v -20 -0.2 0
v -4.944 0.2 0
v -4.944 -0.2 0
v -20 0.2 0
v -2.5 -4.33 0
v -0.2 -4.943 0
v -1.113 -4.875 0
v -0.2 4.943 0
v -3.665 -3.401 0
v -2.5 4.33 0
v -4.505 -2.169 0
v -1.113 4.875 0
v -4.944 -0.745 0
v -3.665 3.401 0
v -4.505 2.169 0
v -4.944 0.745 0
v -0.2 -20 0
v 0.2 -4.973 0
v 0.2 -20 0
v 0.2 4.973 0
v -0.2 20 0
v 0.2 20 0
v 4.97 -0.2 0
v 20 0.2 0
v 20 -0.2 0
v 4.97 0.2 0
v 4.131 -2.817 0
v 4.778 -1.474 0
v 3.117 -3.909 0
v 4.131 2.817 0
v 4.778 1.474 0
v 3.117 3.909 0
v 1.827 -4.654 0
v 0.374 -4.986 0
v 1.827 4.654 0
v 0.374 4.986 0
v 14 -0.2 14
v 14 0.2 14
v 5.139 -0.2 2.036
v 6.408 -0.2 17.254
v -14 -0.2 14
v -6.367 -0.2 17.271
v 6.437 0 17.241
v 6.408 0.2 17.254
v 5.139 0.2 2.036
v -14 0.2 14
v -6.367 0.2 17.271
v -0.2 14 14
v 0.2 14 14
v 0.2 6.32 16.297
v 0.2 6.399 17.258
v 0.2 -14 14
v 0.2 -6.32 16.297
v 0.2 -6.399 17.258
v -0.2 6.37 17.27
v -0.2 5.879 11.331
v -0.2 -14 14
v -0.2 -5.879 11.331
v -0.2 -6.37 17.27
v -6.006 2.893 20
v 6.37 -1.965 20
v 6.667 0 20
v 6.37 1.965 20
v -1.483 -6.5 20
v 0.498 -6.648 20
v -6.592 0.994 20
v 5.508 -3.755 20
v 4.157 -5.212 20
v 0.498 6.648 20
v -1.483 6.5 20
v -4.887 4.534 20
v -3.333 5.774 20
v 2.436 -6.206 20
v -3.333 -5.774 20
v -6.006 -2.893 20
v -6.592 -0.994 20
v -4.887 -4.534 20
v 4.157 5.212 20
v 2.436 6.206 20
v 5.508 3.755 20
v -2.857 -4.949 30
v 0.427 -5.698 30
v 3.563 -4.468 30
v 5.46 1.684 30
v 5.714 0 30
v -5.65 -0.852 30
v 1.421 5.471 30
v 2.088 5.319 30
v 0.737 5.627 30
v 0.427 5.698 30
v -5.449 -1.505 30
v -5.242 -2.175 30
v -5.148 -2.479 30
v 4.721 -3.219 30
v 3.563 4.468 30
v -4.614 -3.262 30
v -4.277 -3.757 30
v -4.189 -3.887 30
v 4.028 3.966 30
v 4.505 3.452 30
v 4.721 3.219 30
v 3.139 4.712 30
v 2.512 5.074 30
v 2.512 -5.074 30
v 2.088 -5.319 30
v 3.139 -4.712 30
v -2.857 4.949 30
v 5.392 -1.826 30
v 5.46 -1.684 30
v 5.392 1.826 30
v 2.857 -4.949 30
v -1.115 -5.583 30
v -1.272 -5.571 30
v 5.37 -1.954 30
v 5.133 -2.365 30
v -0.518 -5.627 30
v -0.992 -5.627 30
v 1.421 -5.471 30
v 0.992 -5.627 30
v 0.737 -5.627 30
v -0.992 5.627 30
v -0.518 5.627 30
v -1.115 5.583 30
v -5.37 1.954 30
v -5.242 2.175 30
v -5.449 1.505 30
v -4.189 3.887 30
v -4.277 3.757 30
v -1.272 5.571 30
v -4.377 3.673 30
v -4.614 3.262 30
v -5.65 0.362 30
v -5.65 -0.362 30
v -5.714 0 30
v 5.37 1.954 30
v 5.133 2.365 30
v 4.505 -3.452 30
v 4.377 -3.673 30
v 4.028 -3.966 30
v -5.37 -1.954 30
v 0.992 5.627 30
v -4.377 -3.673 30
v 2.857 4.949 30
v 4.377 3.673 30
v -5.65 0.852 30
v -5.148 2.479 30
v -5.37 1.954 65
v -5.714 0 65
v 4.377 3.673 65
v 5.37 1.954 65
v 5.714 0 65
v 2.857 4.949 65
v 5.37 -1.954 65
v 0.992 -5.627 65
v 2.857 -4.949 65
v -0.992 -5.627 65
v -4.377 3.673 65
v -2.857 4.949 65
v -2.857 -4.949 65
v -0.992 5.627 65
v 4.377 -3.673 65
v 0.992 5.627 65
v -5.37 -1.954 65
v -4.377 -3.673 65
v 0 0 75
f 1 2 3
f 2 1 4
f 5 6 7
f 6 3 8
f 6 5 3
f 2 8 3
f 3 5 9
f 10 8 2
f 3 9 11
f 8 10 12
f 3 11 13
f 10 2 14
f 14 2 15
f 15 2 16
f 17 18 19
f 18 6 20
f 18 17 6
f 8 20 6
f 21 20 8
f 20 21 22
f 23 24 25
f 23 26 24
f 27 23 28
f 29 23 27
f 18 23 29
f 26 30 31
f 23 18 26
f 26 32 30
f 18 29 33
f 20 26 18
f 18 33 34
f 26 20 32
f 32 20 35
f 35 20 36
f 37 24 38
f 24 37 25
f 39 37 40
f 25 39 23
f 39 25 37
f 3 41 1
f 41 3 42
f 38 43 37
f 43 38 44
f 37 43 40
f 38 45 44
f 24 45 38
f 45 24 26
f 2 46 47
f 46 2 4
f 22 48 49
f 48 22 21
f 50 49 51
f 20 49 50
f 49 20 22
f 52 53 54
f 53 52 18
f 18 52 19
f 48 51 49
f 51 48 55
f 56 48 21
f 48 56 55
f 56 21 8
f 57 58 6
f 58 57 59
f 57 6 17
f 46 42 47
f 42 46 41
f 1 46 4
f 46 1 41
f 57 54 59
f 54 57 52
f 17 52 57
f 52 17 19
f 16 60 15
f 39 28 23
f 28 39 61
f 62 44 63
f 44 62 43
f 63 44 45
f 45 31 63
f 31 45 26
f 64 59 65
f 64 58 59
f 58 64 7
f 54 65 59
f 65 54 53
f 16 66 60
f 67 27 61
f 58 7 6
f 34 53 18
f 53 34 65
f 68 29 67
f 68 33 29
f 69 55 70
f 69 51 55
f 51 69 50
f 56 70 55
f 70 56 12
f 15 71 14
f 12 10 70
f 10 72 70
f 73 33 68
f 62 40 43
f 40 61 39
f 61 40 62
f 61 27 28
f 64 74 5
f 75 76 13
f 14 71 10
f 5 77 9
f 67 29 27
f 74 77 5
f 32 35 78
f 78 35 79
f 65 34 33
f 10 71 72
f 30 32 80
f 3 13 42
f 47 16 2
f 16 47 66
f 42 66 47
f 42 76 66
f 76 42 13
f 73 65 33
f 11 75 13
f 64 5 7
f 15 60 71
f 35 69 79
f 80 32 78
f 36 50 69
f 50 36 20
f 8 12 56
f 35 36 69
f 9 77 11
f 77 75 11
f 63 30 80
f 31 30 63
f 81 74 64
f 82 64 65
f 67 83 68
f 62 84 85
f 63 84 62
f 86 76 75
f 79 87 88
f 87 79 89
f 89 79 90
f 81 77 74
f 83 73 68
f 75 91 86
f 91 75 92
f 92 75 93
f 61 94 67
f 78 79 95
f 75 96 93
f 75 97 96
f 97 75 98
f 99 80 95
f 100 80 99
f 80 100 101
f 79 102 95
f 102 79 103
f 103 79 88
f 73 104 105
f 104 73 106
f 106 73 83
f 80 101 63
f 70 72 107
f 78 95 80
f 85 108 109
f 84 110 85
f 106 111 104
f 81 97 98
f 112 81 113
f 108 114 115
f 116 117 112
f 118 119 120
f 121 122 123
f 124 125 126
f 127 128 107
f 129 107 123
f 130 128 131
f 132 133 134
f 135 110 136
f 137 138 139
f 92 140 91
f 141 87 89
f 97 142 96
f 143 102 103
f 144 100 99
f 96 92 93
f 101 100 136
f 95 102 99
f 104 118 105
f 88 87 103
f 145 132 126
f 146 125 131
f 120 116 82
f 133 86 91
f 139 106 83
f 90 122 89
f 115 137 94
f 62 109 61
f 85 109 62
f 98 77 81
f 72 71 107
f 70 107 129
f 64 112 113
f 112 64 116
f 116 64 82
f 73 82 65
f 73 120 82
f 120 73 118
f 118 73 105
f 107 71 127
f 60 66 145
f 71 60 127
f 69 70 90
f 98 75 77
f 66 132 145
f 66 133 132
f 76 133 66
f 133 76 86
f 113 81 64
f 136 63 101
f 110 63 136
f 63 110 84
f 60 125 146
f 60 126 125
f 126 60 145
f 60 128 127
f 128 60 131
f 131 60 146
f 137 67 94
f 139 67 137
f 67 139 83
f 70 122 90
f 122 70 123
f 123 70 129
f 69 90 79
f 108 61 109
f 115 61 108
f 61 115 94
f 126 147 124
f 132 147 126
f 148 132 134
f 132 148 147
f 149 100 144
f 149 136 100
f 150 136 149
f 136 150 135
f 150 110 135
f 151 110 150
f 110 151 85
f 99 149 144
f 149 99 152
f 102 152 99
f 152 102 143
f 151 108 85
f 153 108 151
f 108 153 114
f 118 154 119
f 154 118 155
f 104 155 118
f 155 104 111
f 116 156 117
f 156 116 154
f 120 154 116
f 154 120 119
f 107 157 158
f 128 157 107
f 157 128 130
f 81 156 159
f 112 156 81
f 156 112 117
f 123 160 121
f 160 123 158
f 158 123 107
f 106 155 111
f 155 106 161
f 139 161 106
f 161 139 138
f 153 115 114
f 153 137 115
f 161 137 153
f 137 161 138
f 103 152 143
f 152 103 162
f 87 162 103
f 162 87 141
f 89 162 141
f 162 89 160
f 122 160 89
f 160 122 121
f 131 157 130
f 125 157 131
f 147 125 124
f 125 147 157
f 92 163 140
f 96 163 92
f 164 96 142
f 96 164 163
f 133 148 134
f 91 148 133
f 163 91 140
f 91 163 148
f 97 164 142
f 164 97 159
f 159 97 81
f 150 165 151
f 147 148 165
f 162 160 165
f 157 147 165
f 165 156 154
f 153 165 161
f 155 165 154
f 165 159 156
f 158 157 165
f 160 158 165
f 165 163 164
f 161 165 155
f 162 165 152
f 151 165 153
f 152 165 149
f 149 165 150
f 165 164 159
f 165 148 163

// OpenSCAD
module wing(scale=10) {
	rotate([90,0,0])
	linear_extrude(height = scale*0.02, center = true)
	polygon(points=[[0,0],[0,scale],[scale*0.7,scale*0.7],[scale,0]]);
}

module rocket(scale=10) {
	rotate([0,0,0])
	wing(scale);

	rotate([0,0,90])
	wing(scale);

	rotate([0,0,180])
	wing(scale);

	rotate([0,0,270])
	wing(scale);

	// Cylinder base
	color("green",0.5)
	cylinder(h = scale, r1=scale/4, r2=scale/3);

	// Cylinder mid
	midHeight = scale/2;
	midWidth  = scale/3.5;
	translate([0,0,scale])
	color("red",0.5)
	cylinder(h = midHeight, r1=scale/3, r2=midWidth);

	// Cylinder long
	longHeight = scale+midHeight;
	translate([0,0,longHeight])
	color("blue",0.5)
	cylinder(h = scale*1.75, r1=midWidth, r2=scale/3.5);

	coneHeight = scale*1.75+longHeight;
	translate([0,0,coneHeight])
	color("black",0.5)
	cylinder(h = (scale/2), r1=midWidth, r2=0);

}




rocket(20);
